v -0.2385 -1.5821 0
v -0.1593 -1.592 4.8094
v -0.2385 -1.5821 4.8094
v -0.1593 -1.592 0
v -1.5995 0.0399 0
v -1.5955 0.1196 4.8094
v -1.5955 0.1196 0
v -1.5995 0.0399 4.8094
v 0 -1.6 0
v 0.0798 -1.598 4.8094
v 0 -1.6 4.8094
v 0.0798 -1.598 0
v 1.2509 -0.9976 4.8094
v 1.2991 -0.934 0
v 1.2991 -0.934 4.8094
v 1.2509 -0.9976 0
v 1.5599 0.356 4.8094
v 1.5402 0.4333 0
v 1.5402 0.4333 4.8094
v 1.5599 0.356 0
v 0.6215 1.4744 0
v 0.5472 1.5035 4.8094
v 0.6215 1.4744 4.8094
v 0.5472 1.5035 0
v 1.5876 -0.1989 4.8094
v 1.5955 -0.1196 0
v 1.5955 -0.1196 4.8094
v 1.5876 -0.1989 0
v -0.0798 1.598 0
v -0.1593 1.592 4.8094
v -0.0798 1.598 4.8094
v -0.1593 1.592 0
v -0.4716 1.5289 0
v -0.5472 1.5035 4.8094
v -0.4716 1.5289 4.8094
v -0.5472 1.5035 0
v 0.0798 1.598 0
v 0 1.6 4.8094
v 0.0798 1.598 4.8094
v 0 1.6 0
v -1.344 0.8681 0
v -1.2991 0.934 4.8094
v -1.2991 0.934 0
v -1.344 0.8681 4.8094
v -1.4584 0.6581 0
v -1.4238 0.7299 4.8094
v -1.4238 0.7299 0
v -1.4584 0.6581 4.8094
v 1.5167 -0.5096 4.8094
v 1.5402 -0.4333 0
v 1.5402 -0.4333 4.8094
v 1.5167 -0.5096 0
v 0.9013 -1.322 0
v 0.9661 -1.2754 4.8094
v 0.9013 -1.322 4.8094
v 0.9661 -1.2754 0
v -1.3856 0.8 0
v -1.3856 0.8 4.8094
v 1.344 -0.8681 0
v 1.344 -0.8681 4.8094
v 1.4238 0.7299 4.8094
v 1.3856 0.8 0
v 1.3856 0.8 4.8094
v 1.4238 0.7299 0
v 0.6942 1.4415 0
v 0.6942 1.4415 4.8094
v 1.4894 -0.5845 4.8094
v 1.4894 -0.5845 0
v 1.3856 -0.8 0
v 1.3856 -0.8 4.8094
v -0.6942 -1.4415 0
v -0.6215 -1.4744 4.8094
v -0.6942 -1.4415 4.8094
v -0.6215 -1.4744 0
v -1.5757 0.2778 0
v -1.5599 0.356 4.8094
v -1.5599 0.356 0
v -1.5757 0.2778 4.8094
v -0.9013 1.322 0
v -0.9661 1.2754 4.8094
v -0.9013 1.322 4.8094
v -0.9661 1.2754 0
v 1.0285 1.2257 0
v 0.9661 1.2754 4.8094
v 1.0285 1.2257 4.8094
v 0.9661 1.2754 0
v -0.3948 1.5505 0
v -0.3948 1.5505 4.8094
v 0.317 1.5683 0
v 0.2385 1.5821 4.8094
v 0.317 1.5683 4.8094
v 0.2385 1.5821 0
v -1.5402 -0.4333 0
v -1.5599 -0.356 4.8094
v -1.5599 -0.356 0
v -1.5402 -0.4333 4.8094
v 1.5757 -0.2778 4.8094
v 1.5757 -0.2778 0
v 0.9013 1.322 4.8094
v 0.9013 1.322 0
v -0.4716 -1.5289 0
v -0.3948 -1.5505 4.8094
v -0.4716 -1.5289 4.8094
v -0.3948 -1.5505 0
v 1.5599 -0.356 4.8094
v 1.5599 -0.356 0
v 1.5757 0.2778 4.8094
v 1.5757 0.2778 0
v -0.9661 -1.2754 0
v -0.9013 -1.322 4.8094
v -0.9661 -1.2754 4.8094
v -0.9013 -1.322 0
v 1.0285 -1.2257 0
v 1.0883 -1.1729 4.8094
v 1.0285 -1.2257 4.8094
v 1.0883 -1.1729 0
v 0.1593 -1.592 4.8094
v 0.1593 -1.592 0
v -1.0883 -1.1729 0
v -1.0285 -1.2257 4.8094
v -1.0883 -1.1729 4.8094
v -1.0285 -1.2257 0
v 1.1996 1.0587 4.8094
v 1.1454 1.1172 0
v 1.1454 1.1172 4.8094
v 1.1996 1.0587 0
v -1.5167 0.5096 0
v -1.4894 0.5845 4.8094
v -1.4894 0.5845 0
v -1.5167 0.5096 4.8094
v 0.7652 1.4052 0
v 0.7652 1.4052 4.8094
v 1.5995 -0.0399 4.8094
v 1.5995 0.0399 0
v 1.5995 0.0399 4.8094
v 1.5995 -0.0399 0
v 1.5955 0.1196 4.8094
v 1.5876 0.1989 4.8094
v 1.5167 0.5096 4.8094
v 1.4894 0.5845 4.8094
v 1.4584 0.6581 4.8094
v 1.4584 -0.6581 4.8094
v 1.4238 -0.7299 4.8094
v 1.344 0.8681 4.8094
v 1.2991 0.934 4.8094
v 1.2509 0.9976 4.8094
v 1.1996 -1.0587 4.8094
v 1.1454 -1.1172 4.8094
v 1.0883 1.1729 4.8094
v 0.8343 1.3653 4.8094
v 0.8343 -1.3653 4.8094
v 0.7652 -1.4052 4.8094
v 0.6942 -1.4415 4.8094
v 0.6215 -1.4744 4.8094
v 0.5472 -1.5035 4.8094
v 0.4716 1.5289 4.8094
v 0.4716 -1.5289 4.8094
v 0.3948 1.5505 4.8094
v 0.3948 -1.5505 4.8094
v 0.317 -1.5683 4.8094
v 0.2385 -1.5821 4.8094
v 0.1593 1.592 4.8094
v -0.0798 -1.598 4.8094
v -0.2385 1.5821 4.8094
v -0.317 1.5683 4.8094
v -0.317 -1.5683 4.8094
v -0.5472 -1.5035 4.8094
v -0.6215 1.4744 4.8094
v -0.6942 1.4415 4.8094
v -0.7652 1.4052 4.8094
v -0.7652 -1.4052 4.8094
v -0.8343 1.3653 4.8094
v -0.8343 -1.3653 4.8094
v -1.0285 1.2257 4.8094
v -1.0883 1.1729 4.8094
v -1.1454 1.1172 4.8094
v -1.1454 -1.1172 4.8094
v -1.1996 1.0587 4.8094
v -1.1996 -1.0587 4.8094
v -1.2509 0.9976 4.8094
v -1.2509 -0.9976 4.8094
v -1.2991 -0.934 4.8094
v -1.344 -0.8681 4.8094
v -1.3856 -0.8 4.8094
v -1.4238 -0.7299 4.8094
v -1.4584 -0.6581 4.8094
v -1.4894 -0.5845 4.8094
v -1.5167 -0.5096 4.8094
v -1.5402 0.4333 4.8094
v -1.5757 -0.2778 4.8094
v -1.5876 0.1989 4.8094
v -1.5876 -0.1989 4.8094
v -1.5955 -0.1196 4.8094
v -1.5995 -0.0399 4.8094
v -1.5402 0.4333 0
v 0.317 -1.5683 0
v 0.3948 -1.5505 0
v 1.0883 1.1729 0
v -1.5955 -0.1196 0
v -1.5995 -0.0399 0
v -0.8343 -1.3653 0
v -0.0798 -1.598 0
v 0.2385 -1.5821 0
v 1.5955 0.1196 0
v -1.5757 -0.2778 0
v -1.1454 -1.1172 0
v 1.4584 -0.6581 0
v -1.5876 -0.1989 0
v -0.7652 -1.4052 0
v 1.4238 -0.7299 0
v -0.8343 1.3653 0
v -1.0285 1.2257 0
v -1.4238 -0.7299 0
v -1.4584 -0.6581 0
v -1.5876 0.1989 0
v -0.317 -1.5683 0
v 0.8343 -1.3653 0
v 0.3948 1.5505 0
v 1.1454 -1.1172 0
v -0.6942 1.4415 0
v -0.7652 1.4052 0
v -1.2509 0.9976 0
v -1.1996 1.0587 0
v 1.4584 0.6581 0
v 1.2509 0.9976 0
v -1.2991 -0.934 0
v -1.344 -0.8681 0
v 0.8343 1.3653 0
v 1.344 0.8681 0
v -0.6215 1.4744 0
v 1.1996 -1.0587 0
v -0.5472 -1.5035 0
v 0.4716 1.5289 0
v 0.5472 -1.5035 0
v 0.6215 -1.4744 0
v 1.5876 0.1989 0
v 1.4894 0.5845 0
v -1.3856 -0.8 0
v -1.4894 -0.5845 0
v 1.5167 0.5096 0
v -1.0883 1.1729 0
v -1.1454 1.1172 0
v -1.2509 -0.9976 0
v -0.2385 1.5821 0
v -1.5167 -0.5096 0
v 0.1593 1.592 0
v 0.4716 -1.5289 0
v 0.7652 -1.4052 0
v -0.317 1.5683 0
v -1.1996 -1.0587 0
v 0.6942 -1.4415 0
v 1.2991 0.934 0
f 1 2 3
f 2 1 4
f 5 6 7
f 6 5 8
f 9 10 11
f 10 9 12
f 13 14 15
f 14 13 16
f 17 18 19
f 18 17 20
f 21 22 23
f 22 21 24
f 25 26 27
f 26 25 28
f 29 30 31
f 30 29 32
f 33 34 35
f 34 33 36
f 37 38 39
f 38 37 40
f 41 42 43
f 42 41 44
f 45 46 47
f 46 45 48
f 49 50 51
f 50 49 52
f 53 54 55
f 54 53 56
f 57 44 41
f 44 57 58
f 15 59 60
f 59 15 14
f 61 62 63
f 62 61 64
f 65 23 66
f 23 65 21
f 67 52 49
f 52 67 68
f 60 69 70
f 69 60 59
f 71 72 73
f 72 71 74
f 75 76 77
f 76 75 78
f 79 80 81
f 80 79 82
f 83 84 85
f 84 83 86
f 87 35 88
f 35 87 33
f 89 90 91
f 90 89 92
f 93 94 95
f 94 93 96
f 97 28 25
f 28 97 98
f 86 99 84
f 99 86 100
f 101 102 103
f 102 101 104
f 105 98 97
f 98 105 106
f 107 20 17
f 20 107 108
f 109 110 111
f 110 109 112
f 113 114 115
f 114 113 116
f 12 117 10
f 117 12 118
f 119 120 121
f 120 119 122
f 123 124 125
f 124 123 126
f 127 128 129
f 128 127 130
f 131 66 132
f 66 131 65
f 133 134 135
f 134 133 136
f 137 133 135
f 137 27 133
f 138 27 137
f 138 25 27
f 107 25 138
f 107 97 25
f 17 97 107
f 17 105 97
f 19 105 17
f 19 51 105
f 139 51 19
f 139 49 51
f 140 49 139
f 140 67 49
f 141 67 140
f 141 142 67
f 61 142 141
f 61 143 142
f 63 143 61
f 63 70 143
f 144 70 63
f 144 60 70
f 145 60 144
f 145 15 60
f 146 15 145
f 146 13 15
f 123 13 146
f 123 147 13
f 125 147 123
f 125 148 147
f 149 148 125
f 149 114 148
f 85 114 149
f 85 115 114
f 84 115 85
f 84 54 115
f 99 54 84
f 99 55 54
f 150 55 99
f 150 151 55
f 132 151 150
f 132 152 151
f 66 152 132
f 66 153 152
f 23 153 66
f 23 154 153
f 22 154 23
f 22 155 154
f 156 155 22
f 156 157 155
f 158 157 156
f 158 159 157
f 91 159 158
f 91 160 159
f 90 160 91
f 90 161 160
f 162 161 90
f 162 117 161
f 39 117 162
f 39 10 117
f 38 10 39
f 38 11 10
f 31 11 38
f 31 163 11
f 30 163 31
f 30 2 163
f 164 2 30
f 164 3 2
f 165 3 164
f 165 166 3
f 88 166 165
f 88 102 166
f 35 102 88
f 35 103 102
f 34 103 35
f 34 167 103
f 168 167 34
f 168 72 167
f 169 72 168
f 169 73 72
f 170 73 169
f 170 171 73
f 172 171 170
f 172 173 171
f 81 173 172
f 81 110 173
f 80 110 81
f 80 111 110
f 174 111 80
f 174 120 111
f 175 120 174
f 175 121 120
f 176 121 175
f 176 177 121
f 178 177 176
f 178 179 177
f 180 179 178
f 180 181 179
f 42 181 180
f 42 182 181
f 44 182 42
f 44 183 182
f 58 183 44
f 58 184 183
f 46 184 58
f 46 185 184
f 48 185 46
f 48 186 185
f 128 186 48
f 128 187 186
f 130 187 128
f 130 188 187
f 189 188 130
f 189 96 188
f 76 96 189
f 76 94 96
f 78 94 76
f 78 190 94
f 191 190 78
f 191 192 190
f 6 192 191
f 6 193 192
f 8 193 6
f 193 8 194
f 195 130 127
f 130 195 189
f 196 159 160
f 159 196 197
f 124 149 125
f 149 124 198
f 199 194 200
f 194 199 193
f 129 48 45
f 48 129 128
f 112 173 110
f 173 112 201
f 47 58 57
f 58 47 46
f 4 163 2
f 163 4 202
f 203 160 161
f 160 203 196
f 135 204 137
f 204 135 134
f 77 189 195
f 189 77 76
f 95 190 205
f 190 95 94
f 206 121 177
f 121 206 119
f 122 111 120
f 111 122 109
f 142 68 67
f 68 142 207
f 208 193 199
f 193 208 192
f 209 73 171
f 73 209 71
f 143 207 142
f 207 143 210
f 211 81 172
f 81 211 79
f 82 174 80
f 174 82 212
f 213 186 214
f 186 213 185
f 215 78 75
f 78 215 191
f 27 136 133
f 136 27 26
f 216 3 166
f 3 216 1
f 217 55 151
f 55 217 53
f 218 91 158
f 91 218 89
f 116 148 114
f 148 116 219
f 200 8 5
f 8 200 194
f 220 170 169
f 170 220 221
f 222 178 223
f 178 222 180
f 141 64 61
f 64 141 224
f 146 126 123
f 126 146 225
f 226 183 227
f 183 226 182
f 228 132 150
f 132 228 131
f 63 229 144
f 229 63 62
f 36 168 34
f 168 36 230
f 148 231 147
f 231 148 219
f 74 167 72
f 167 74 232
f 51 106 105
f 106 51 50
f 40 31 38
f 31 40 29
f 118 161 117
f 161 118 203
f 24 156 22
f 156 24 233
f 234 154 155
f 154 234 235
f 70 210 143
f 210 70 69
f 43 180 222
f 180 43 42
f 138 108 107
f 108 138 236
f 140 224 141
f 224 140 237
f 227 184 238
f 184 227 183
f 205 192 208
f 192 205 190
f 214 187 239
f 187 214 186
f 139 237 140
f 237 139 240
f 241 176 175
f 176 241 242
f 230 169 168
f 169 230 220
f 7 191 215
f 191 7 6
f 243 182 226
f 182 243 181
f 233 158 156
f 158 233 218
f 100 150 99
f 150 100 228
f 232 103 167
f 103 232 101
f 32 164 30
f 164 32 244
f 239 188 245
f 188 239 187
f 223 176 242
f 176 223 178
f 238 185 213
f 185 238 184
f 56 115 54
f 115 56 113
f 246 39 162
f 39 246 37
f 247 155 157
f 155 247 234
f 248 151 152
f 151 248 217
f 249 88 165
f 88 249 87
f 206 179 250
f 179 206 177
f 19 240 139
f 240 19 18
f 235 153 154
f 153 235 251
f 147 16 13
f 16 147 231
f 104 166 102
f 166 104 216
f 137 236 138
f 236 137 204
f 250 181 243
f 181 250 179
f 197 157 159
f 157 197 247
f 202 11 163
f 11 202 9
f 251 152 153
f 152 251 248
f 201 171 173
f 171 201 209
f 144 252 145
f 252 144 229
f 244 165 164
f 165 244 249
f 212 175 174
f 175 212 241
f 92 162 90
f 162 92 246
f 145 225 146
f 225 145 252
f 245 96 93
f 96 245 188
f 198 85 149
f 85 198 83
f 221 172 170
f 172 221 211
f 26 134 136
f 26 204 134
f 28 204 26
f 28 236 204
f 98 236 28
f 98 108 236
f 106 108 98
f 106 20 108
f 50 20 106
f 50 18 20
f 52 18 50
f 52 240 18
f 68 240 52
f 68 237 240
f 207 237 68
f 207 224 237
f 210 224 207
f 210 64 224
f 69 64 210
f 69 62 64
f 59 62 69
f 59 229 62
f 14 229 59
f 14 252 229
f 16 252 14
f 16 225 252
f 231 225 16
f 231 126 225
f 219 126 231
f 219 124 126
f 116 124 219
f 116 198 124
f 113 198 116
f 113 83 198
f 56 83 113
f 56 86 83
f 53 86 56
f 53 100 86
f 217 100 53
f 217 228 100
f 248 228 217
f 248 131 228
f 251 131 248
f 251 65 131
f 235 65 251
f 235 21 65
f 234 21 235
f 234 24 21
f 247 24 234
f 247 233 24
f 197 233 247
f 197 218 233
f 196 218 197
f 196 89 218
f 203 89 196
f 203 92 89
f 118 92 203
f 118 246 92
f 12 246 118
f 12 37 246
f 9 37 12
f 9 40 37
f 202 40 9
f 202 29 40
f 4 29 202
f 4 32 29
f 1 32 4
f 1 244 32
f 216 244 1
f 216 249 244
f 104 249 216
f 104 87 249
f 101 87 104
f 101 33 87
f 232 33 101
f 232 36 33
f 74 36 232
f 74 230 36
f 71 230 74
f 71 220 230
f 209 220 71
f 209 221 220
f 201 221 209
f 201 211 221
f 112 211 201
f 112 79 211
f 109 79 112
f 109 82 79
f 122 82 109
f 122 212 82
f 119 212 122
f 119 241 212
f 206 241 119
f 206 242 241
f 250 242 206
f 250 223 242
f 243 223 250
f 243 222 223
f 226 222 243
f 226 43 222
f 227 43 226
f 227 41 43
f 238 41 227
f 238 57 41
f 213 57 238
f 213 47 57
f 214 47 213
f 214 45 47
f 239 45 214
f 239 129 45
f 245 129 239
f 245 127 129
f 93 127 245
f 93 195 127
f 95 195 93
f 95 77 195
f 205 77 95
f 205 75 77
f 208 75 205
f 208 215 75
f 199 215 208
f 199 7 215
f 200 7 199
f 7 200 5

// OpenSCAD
// file: ../p/stud.scad
use <../lib.scad>
use <4-4cyli.scad>
use <4-4disc.scad>
use <4-4edge.scad>
$fa=1; $fs=0.2;
function ldraw_lib__stud(realsolid=false) = realsolid ? 
    [openscad(translate([0,0,-eps()], o=cylinder(4+eps(), r=6)),2)] : [
// 0 Stud
// 0 Name: stud.dat
// 0 Author: James Jessiman
// 0 !LDRAW_ORG Primitive UPDATE 2012-01
// 0 !LICENSE Licensed under CC BY 2.0 and CC BY 4.0 : see CAreadme.txt
// 
// 0 BFC CERTIFY CCW
  [0,"BFC","CERTIFY"],
  [0,"BFC","CCW"],
// 
// 0 !HISTORY 2002-04-04 [sbliss] Modified for BFC compliance
// 0 !HISTORY 2002-04-25 [PTadmin] Official Update 2002-02
// 0 !HISTORY 2007-06-24 [PTadmin] Header formatted for Contributor Agreement
// 0 !HISTORY 2008-07-01 [PTadmin] Official Update 2008-01
// 0 !HISTORY 2012-02-16 [Philo] Changed to CCW
// 0 !HISTORY 2012-03-30 [PTadmin] Official Update 2012-01
// 
// 
// 1 16 0 0 0 6 0 0 0 1 0 0 0 6 4-4edge.dat
  [1,16,0,0,0,6,0,0,0,1,0,0,0,6, ldraw_lib__4_4edge(realsolid)],
// 1 16 0 -4 0 6 0 0 0 1 0 0 0 6 4-4edge.dat
  [1,16,0,-4,0,6,0,0,0,1,0,0,0,6, ldraw_lib__4_4edge(realsolid)],
// 1 16 0 0 0 6 0 0 0 -4 0 0 0 6 4-4cyli.dat
  [1,16,0,0,0,6,0,0,0,-4,0,0,0,6, ldraw_lib__4_4cyli(realsolid)],
// 1 16 0 -4 0 6 0 0 0 1 0 0 0 6 4-4disc.dat
  [1,16,0,-4,0,6,0,0,0,1,0,0,0,6, ldraw_lib__4_4disc(realsolid)],
];
module ldraw_lib__stud(step=0, col=false, unit=2/5, alt=false, line=0.2, solid=!$preview)
    makepoly(ldraw_lib__stud(solid), step=step, col=col, unit=unit, alt=alt, line=line, solid=solid);
ldraw_lib__stud(line=0.2);
// file: ../p/box4t.scad
use <../lib.scad>
$fa=1; $fs=0.2;
function ldraw_lib__box4t(realsolid=false) = [
// 0 Box with 4 Adjacent Faces and All Edges
// 0 Name: box4t.dat
// 0 Author: Tore Eriksson [Tore_Eriksson]
// 0 !LDRAW_ORG Primitive UPDATE 2003-02
// 0 !LICENSE Licensed under CC BY 2.0 and CC BY 4.0 : see CAreadme.txt
// 
// 0 BFC CERTIFY CCW
  [0,"BFC","CERTIFY"],
  [0,"BFC","CCW"],
// 
// 0 !HISTORY 1997-09-29 [PTadmin] Official Update 1997-15
// 0 !HISTORY 2002-08-31 [izanette] Modified with WINDZ for BFC compliance
// 0 !HISTORY 2003-08-01 [PTadmin] Official Update 2003-02
// 0 !HISTORY 2007-06-24 [PTadmin] Header formatted for Contributor Agreement
// 0 !HISTORY 2008-07-01 [PTadmin] Official Update 2008-01
// 
// 
// 2 24 1 1 1 -1 1 1
  [2,24,1,1,1,-1,1,1],
// 2 24 -1 1 1 -1 1 -1
  [2,24,-1,1,1,-1,1,-1],
// 2 24 -1 1 -1 1 1 -1
  [2,24,-1,1,-1,1,1,-1],
// 2 24 1 1 -1 1 1 1
  [2,24,1,1,-1,1,1,1],
// 2 24 1 0 1 -1 0 1
  [2,24,1,0,1,-1,0,1],
// 2 24 -1 0 1 -1 0 -1
  [2,24,-1,0,1,-1,0,-1],
// 2 24 -1 0 -1 1 0 -1
  [2,24,-1,0,-1,1,0,-1],
// 2 24 1 0 -1 1 0 1
  [2,24,1,0,-1,1,0,1],
// 2 24 1 0 1 1 1 1
  [2,24,1,0,1,1,1,1],
// 2 24 -1 0 1 -1 1 1
  [2,24,-1,0,1,-1,1,1],
// 2 24 1 0 -1 1 1 -1
  [2,24,1,0,-1,1,1,-1],
// 2 24 -1 0 -1 -1 1 -1
  [2,24,-1,0,-1,-1,1,-1],
// 4 16 1 1 1 1 1 -1 -1 1 -1 -1 1 1
  [4,16,1,1,1,1,1,-1,-1,1,-1,-1,1,1],
// 4 16 1 1 1 -1 1 1 -1 0 1 1 0 1
  [4,16,1,1,1,-1,1,1,-1,0,1,1,0,1],
// 4 16 -1 1 1 -1 1 -1 -1 0 -1 -1 0 1
  [4,16,-1,1,1,-1,1,-1,-1,0,-1,-1,0,1],
// 0 4 16 -1 1 -1 -1 0 -1 1 0 -1 1 1 -1
// 4 16 1 1 -1 1 1 1 1 0 1 1 0 -1
  [4,16,1,1,-1,1,1,1,1,0,1,1,0,-1],
// 0
];
module ldraw_lib__box4t(step=0, col=false, unit=2/5, alt=false, line=0.2, solid=!$preview)
    makepoly(ldraw_lib__box4t(solid), step=step, col=col, unit=unit, alt=alt, line=line, solid=solid);
ldraw_lib__box4t(line=0.2);
// file: ../p/4-4edge.scad
use <../lib.scad>
$fa=1; $fs=0.2;
function ldraw_lib__4_4edge(realsolid=false) = [
// 0 Circle 1.0
// 0 Name: 4-4edge.dat
// 0 Author: James Jessiman
// 0 !LDRAW_ORG Primitive UPDATE 2017-01
// 0 !LICENSE Licensed under CC BY 2.0 and CC BY 4.0 : see CAreadme.txt
// 
// 0 BFC CERTIFY CCW
  [0,"BFC","CERTIFY"],
  [0,"BFC","CCW"],
// 
// 0 !HISTORY 1998-12-15 [PTadmin] Official Update 1998-10
// 0 !HISTORY 2005-12-28 [PTadmin] Official Update 2005-01
// 0 !HISTORY 2007-06-24 [PTadmin] Header formatted for Contributor Agreement
// 0 !HISTORY 2008-07-01 [PTadmin] Official Update 2008-01
// 0 !HISTORY 2017-01-15 [Steffen] BFCed
// 0 !HISTORY 2017-12-30 [PTadmin] Official Update 2017-01
// 
// 
// 2 24 1 0 0 0.9239 0 0.3827
  [2,24,1,0,0,0.9239,0,0.3827],
// 2 24 0.9239 0 0.3827 0.7071 0 0.7071
  [2,24,0.9239,0,0.3827,0.7071,0,0.7071],
// 2 24 0.7071 0 0.7071 0.3827 0 0.9239
  [2,24,0.7071,0,0.7071,0.3827,0,0.9239],
// 2 24 0.3827 0 0.9239 0 0 1
  [2,24,0.3827,0,0.9239,0,0,1],
// 2 24 0 0 1 -0.3827 0 0.9239
  [2,24,0,0,1,-0.3827,0,0.9239],
// 2 24 -0.3827 0 0.9239 -0.7071 0 0.7071
  [2,24,-0.3827,0,0.9239,-0.7071,0,0.7071],
// 2 24 -0.7071 0 0.7071 -0.9239 0 0.3827
  [2,24,-0.7071,0,0.7071,-0.9239,0,0.3827],
// 2 24 -0.9239 0 0.3827 -1 0 -0
  [2,24,-0.9239,0,0.3827,-1,0,-0],
// 2 24 -1 0 -0 -0.9239 0 -0.3827
  [2,24,-1,0,-0,-0.9239,0,-0.3827],
// 2 24 -0.9239 0 -0.3827 -0.7071 0 -0.7071
  [2,24,-0.9239,0,-0.3827,-0.7071,0,-0.7071],
// 2 24 -0.7071 0 -0.7071 -0.3827 0 -0.9239
  [2,24,-0.7071,0,-0.7071,-0.3827,0,-0.9239],
// 2 24 -0.3827 0 -0.9239 0 0 -1
  [2,24,-0.3827,0,-0.9239,0,0,-1],
// 2 24 0 0 -1 0.3827 0 -0.9239
  [2,24,0,0,-1,0.3827,0,-0.9239],
// 2 24 0.3827 0 -0.9239 0.7071 0 -0.7071
  [2,24,0.3827,0,-0.9239,0.7071,0,-0.7071],
// 2 24 0.7071 0 -0.7071 0.9239 0 -0.3827
  [2,24,0.7071,0,-0.7071,0.9239,0,-0.3827],
// 2 24 0.9239 0 -0.3827 1 0 0
  [2,24,0.9239,0,-0.3827,1,0,0],
];
module ldraw_lib__4_4edge(step=0, col=false, unit=2/5, alt=false, line=0.2, solid=!$preview)
    makepoly(ldraw_lib__4_4edge(solid), step=step, col=col, unit=unit, alt=alt, line=line, solid=solid);
ldraw_lib__4_4edge(line=0.2);
// file: ../p/4-4disc.scad
use <../lib.scad>
$fa=1; $fs=0.2;
function ldraw_lib__4_4disc(realsolid=false) = [
// 0 Disc 1.0
// 0 Name: 4-4disc.dat
// 0 Author: James Jessiman
// 0 !LDRAW_ORG Primitive UPDATE 2002-02
// 0 !LICENSE Licensed under CC BY 2.0 and CC BY 4.0 : see CAreadme.txt
// 
// 0 BFC CERTIFY CCW
  [0,"BFC","CERTIFY"],
  [0,"BFC","CCW"],
// 
// 0 !HISTORY 1998-12-15 [PTadmin] Official Update 1998-10
// 0 !HISTORY 2002-03-23 [sbliss] Added BFC statement
// 0 !HISTORY 2002-04-25 [PTadmin] Official Update 2002-02
// 0 !HISTORY 2007-06-24 [PTadmin] Header formatted for Contributor Agreement
// 0 !HISTORY 2008-07-01 [PTadmin] Official Update 2008-01
// 
// 
// 3 16 0 0 0 1 0 0 0.9239 0 0.3827
  [3,16,0,0,0,1,0,0,0.9239,0,0.3827],
// 3 16 0 0 0 0.9239 0 0.3827 0.7071 0 0.7071
  [3,16,0,0,0,0.9239,0,0.3827,0.7071,0,0.7071],
// 3 16 0 0 0 0.7071 0 0.7071 0.3827 0 0.9239
  [3,16,0,0,0,0.7071,0,0.7071,0.3827,0,0.9239],
// 3 16 0 0 0 0.3827 0 0.9239 0 0 1
  [3,16,0,0,0,0.3827,0,0.9239,0,0,1],
// 3 16 0 0 0 0 0 1 -0.3827 0 0.9239
  [3,16,0,0,0,0,0,1,-0.3827,0,0.9239],
// 3 16 0 0 0 -0.3827 0 0.9239 -0.7071 0 0.7071
  [3,16,0,0,0,-0.3827,0,0.9239,-0.7071,0,0.7071],
// 3 16 0 0 0 -0.7071 0 0.7071 -0.9239 0 0.3827
  [3,16,0,0,0,-0.7071,0,0.7071,-0.9239,0,0.3827],
// 3 16 0 0 0 -0.9239 0 0.3827 -1 0 -0
  [3,16,0,0,0,-0.9239,0,0.3827,-1,0,-0],
// 3 16 0 0 0 -1 0 -0 -0.9239 0 -0.3827
  [3,16,0,0,0,-1,0,-0,-0.9239,0,-0.3827],
// 3 16 0 0 0 -0.9239 0 -0.3827 -0.7071 0 -0.7071
  [3,16,0,0,0,-0.9239,0,-0.3827,-0.7071,0,-0.7071],
// 3 16 0 0 0 -0.7071 0 -0.7071 -0.3827 0 -0.9239
  [3,16,0,0,0,-0.7071,0,-0.7071,-0.3827,0,-0.9239],
// 3 16 0 0 0 -0.3827 0 -0.9239 0 0 -1
  [3,16,0,0,0,-0.3827,0,-0.9239,0,0,-1],
// 3 16 0 0 0 0 0 -1 0.3827 0 -0.9239
  [3,16,0,0,0,0,0,-1,0.3827,0,-0.9239],
// 3 16 0 0 0 0.3827 0 -0.9239 0.7071 0 -0.7071
  [3,16,0,0,0,0.3827,0,-0.9239,0.7071,0,-0.7071],
// 3 16 0 0 0 0.7071 0 -0.7071 0.9239 0 -0.3827
  [3,16,0,0,0,0.7071,0,-0.7071,0.9239,0,-0.3827],
// 3 16 0 0 0 0.9239 0 -0.3827 1 0 0
  [3,16,0,0,0,0.9239,0,-0.3827,1,0,0],
// 0
];
module ldraw_lib__4_4disc(step=0, col=false, unit=2/5, alt=false, line=0.2, solid=!$preview)
    makepoly(ldraw_lib__4_4disc(solid), step=step, col=col, unit=unit, alt=alt, line=line, solid=solid);
ldraw_lib__4_4disc(line=0.2);
// file: ../p/4-4cyli.scad
use <../lib.scad>
$fa=1; $fs=0.2;
function ldraw_lib__4_4cyli(realsolid=false) = [
// 0 Cylinder 1.0
// 0 Name: 4-4cyli.dat
// 0 Author: James Jessiman
// 0 !LDRAW_ORG Primitive UPDATE 2005-01
// 0 !LICENSE Licensed under CC BY 2.0 and CC BY 4.0 : see CAreadme.txt
// 
// 0 BFC CERTIFY CCW
  [0,"BFC","CERTIFY"],
  [0,"BFC","CCW"],
// 
// 0 !HISTORY 1998-12-15 [PTadmin] Official Update 1998-10
// 0 !HISTORY 2002-03-23 [sbliss] Added BFC statement; merged headers from files in distributions LDraw 0.27 and Complete.
// 0 !HISTORY 2002-04-25 [PTadmin] Official Update 2002-02
// 0 !HISTORY 2004-12-14 [guyvivan] BFC CCW
// 0 !HISTORY 2005-12-28 [PTadmin] Official Update 2005-01
// 0 !HISTORY 2007-06-24 [PTadmin] Header formatted for Contributor Agreement
// 0 !HISTORY 2008-07-01 [PTadmin] Official Update 2008-01
// 
// 
// 4 16 1 1 0 0.9239 1 0.3827 0.9239 0 0.3827 1 0 0
  [4,16,1,1,0,0.9239,1,0.3827,0.9239,0,0.3827,1,0,0],
// 5 24 1 0 0 1 1 0 0.9239 0 0.3827 0.9239 0 -0.3827
  [5,24,1,0,0,1,1,0,0.9239,0,0.3827,0.9239,0,-0.3827],
// 4 16 0.9239 1 0.3827 0.7071 1 0.7071 0.7071 0 0.7071 0.9239 0 0.3827
  [4,16,0.9239,1,0.3827,0.7071,1,0.7071,0.7071,0,0.7071,0.9239,0,0.3827],
// 5 24 0.9239 0 0.3827 0.9239 1 0.3827 0.7071 0 0.7071 1 0 0
  [5,24,0.9239,0,0.3827,0.9239,1,0.3827,0.7071,0,0.7071,1,0,0],
// 4 16 0.7071 1 0.7071 0.3827 1 0.9239 0.3827 0 0.9239 0.7071 0 0.7071
  [4,16,0.7071,1,0.7071,0.3827,1,0.9239,0.3827,0,0.9239,0.7071,0,0.7071],
// 5 24 0.7071 0 0.7071 0.7071 1 0.7071 0.3827 0 0.9239 0.9239 0 0.3827
  [5,24,0.7071,0,0.7071,0.7071,1,0.7071,0.3827,0,0.9239,0.9239,0,0.3827],
// 4 16 0.3827 1 0.9239 0 1 1 0 0 1 0.3827 0 0.9239
  [4,16,0.3827,1,0.9239,0,1,1,0,0,1,0.3827,0,0.9239],
// 5 24 0.3827 0 0.9239 0.3827 1 0.9239 0 0 1 0.7071 0 0.7071
  [5,24,0.3827,0,0.9239,0.3827,1,0.9239,0,0,1,0.7071,0,0.7071],
// 4 16 0 1 1 -0.3827 1 0.9239 -0.3827 0 0.9239 0 0 1
  [4,16,0,1,1,-0.3827,1,0.9239,-0.3827,0,0.9239,0,0,1],
// 5 24 0 0 1 0 1 1 -0.3827 0 0.9239 0.3827 0 0.9239
  [5,24,0,0,1,0,1,1,-0.3827,0,0.9239,0.3827,0,0.9239],
// 4 16 -0.3827 1 0.9239 -0.7071 1 0.7071 -0.7071 0 0.7071 -0.3827 0 0.9239
  [4,16,-0.3827,1,0.9239,-0.7071,1,0.7071,-0.7071,0,0.7071,-0.3827,0,0.9239],
// 5 24 -0.3827 0 0.9239 -0.3827 1 0.9239 -0.7071 0 0.7071 0 0 1
  [5,24,-0.3827,0,0.9239,-0.3827,1,0.9239,-0.7071,0,0.7071,0,0,1],
// 4 16 -0.7071 1 0.7071 -0.9239 1 0.3827 -0.9239 0 0.3827 -0.7071 0 0.7071
  [4,16,-0.7071,1,0.7071,-0.9239,1,0.3827,-0.9239,0,0.3827,-0.7071,0,0.7071],
// 5 24 -0.7071 0 0.7071 -0.7071 1 0.7071 -0.9239 0 0.3827 -0.3827 0 0.9239
  [5,24,-0.7071,0,0.7071,-0.7071,1,0.7071,-0.9239,0,0.3827,-0.3827,0,0.9239],
// 4 16 -0.9239 1 0.3827 -1 1 0 -1 0 0 -0.9239 0 0.3827
  [4,16,-0.9239,1,0.3827,-1,1,0,-1,0,0,-0.9239,0,0.3827],
// 5 24 -0.9239 0 0.3827 -0.9239 1 0.3827 -1 0 0 -0.7071 0 0.7071
  [5,24,-0.9239,0,0.3827,-0.9239,1,0.3827,-1,0,0,-0.7071,0,0.7071],
// 4 16 -1 1 0 -0.9239 1 -0.3827 -0.9239 0 -0.3827 -1 0 0
  [4,16,-1,1,0,-0.9239,1,-0.3827,-0.9239,0,-0.3827,-1,0,0],
// 5 24 -1 0 0 -1 1 0 -0.9239 0 -0.3827 -0.9239 0 0.3827
  [5,24,-1,0,0,-1,1,0,-0.9239,0,-0.3827,-0.9239,0,0.3827],
// 4 16 -0.9239 1 -0.3827 -0.7071 1 -0.7071 -0.7071 0 -0.7071 -0.9239 0 -0.3827
  [4,16,-0.9239,1,-0.3827,-0.7071,1,-0.7071,-0.7071,0,-0.7071,-0.9239,0,-0.3827],
// 5 24 -0.9239 0 -0.3827 -0.9239 1 -0.3827 -0.7071 0 -0.7071 -1 0 0
  [5,24,-0.9239,0,-0.3827,-0.9239,1,-0.3827,-0.7071,0,-0.7071,-1,0,0],
// 4 16 -0.7071 1 -0.7071 -0.3827 1 -0.9239 -0.3827 0 -0.9239 -0.7071 0 -0.7071
  [4,16,-0.7071,1,-0.7071,-0.3827,1,-0.9239,-0.3827,0,-0.9239,-0.7071,0,-0.7071],
// 5 24 -0.7071 0 -0.7071 -0.7071 1 -0.7071 -0.3827 0 -0.9239 -0.9239 0 -0.3827
  [5,24,-0.7071,0,-0.7071,-0.7071,1,-0.7071,-0.3827,0,-0.9239,-0.9239,0,-0.3827],
// 4 16 -0.3827 1 -0.9239 0 1 -1 0 0 -1 -0.3827 0 -0.9239
  [4,16,-0.3827,1,-0.9239,0,1,-1,0,0,-1,-0.3827,0,-0.9239],
// 5 24 -0.3827 0 -0.9239 -0.3827 1 -0.9239 0 0 -1 -0.7071 0 -0.7071
  [5,24,-0.3827,0,-0.9239,-0.3827,1,-0.9239,0,0,-1,-0.7071,0,-0.7071],
// 4 16 0 1 -1 0.3827 1 -0.9239 0.3827 0 -0.9239 0 0 -1
  [4,16,0,1,-1,0.3827,1,-0.9239,0.3827,0,-0.9239,0,0,-1],
// 5 24 0 0 -1 0 1 -1 0.3827 0 -0.9239 -0.3827 0 -0.9239
  [5,24,0,0,-1,0,1,-1,0.3827,0,-0.9239,-0.3827,0,-0.9239],
// 4 16 0.3827 1 -0.9239 0.7071 1 -0.7071 0.7071 0 -0.7071 0.3827 0 -0.9239
  [4,16,0.3827,1,-0.9239,0.7071,1,-0.7071,0.7071,0,-0.7071,0.3827,0,-0.9239],
// 5 24 0.3827 0 -0.9239 0.3827 1 -0.9239 0.7071 0 -0.7071 0 0 -1
  [5,24,0.3827,0,-0.9239,0.3827,1,-0.9239,0.7071,0,-0.7071,0,0,-1],
// 4 16 0.7071 1 -0.7071 0.9239 1 -0.3827 0.9239 0 -0.3827 0.7071 0 -0.7071
  [4,16,0.7071,1,-0.7071,0.9239,1,-0.3827,0.9239,0,-0.3827,0.7071,0,-0.7071],
// 5 24 0.7071 0 -0.7071 0.7071 1 -0.7071 0.9239 0 -0.3827 0.3827 0 -0.9239
  [5,24,0.7071,0,-0.7071,0.7071,1,-0.7071,0.9239,0,-0.3827,0.3827,0,-0.9239],
// 4 16 0.9239 1 -0.3827 1 1 0 1 0 0 0.9239 0 -0.3827
  [4,16,0.9239,1,-0.3827,1,1,0,1,0,0,0.9239,0,-0.3827],
// 5 24 0.9239 0 -0.3827 0.9239 1 -0.3827 1 0 0 0.7071 0 -0.7071
  [5,24,0.9239,0,-0.3827,0.9239,1,-0.3827,1,0,0,0.7071,0,-0.7071],
// 0
];
module ldraw_lib__4_4cyli(step=0, col=false, unit=2/5, alt=false, line=0.2, solid=!$preview)
    makepoly(ldraw_lib__4_4cyli(solid), step=step, col=col, unit=unit, alt=alt, line=line, solid=solid);
ldraw_lib__4_4cyli(line=0.2);
// file: s/3004s01.scad
use <../../lib.scad>
use <../../p/box4t.scad>
use <../../p/box5.scad>
use <../../p/stud.scad>
use <../../p/stud3.scad>
$fa=1; $fs=0.2;
function ldraw_lib__s__3004s01(realsolid=false) = [
// 0 ~Brick  1 x  2 without Front Face
// 0 Name: s\3004s01.dat
// 0 Author: James Jessiman
// 0 !LDRAW_ORG Subpart UPDATE 2003-03
// 0 !LICENSE Licensed under CC BY 2.0 and CC BY 4.0 : see CAreadme.txt
// 
// 0 BFC CERTIFY CCW
  [0,"BFC","CERTIFY"],
  [0,"BFC","CCW"],
// 
// 0 !HISTORY 2003-09-07 [jriley] Subfiling, BFC
// 0 !HISTORY 2003-12-19 [PTadmin] Official Update 2003-03
// 0 !HISTORY 2007-08-29 [PTadmin] Header formatted for Contributor Agreement
// 0 !HISTORY 2008-07-01 [PTadmin] Official Update 2008-01
// 
// 
// 1 16 0 4 0 1 0 0 0 -5 0 0 0 1 stud3.dat
  [1,16,0,4,0,1,0,0,0,-5,0,0,0,1, ldraw_lib__stud3(realsolid)],
// 0 BFC INVERTNEXT
  [0,"BFC","INVERTNEXT"],
// 1 16 0 24 0 16 0 0 0 -20 0 0 0 6 box5.dat
  [1,16,0,24,0,16,0,0,0,-20,0,0,0,6, ldraw_lib__box5(realsolid)],
// 4 16 20 24 10 16 24 6 -16 24 6 -20 24 10
  [4,16,20,24,10,16,24,6,-16,24,6,-20,24,10],
// 4 16 -20 24 10 -16 24 6 -16 24 -6 -20 24 -10
  [4,16,-20,24,10,-16,24,6,-16,24,-6,-20,24,-10],
// 4 16 -20 24 -10 -16 24 -6 16 24 -6 20 24 -10
  [4,16,-20,24,-10,-16,24,-6,16,24,-6,20,24,-10],
// 4 16 20 24 -10 16 24 -6 16 24 6 20 24 10
  [4,16,20,24,-10,16,24,-6,16,24,6,20,24,10],
// 1 16 0 24 0 20 0 0 0 -24 0 0 0 10 box4t.dat
  [1,16,0,24,0,20,0,0,0,-24,0,0,0,10, ldraw_lib__box4t(realsolid)],
// 1 16 10 0 0 1 0 0 0 1 0 0 0 1 stud.dat
  [1,16,10,0,0,1,0,0,0,1,0,0,0,1, ldraw_lib__stud(realsolid)],
// 1 16 -10 0 0 1 0 0 0 1 0 0 0 1 stud.dat
  [1,16,-10,0,0,1,0,0,0,1,0,0,0,1, ldraw_lib__stud(realsolid)],
// 0
];
module ldraw_lib__s__3004s01(step=0, col=false, unit=2/5, alt=false, line=0.2, solid=!$preview)
    makepoly(ldraw_lib__s__3004s01(solid), step=step, col=col, unit=unit, alt=alt, line=line, solid=solid);
ldraw_lib__s__3004s01(line=0.2);
// file: ../p/stud3.scad
use <../lib.scad>
use <4-4cyli.scad>
use <4-4disc.scad>
use <4-4edge.scad>
$fa=1; $fs=0.2;
function ldraw_lib__stud3(realsolid=false) = realsolid ? 
    [openscad(translate([0,0,-eps()], o=cylinder(4+eps(), r=4)),2)] : [
// 0 Stud Tube Solid
// 0 Name: stud3.dat
// 0 Author: James Jessiman
// 0 !LDRAW_ORG Primitive UPDATE 2012-01
// 0 !LICENSE Licensed under CC BY 2.0 and CC BY 4.0 : see CAreadme.txt
// 
// 0 BFC CERTIFY CCW
  [0,"BFC","CERTIFY"],
  [0,"BFC","CCW"],
// 
// 0 !HISTORY 2002-04-04 [sbliss] Modified for BFC compliance
// 0 !HISTORY 2002-04-25 [PTadmin] Official Update 2002-02
// 0 !HISTORY 2007-06-24 [PTadmin] Header formatted for Contributor Agreement
// 0 !HISTORY 2008-07-01 [PTadmin] Official Update 2008-01
// 0 !HISTORY 2012-02-16 [Philo] Changed to CCW
// 0 !HISTORY 2012-03-30 [PTadmin] Official Update 2012-01
// 
// 
// 1 16 0 -4 0 4 0 0 0 1 0 0 0 4 4-4edge.dat
  [1,16,0,-4,0,4,0,0,0,1,0,0,0,4, ldraw_lib__4_4edge(realsolid)],
// 1 16 0 0 0 4 0 0 0 1 0 0 0 4 4-4edge.dat
  [1,16,0,0,0,4,0,0,0,1,0,0,0,4, ldraw_lib__4_4edge(realsolid)],
// 1 16 0 -4 0 4 0 0 0 1 0 0 0 4 4-4disc.dat
  [1,16,0,-4,0,4,0,0,0,1,0,0,0,4, ldraw_lib__4_4disc(realsolid)],
// 1 16 0 -4 0 4 0 0 0 4 0 0 0 4 4-4cyli.dat
  [1,16,0,-4,0,4,0,0,0,4,0,0,0,4, ldraw_lib__4_4cyli(realsolid)],
];
module ldraw_lib__stud3(step=0, col=false, unit=2/5, alt=false, line=0.2, solid=!$preview)
    makepoly(ldraw_lib__stud3(solid), step=step, col=col, unit=unit, alt=alt, line=line, solid=solid);
ldraw_lib__stud3(line=0.2);
// file: ../p/box5.scad
use <../lib.scad>
$fa=1; $fs=0.2;
function ldraw_lib__box5(realsolid=false) = [
// 0 Box with 5 Faces and All Edges
// 0 Name: box5.dat
// 0 Author: James Jessiman
// 0 !LDRAW_ORG Primitive UPDATE 2012-01
// 0 !LICENSE Licensed under CC BY 2.0 and CC BY 4.0 : see CAreadme.txt
// 
// 0 BFC CERTIFY CCW
  [0,"BFC","CERTIFY"],
  [0,"BFC","CCW"],
// 
// 0 !HISTORY 2002-04-03 [sbliss] Modified for BFC compliance
// 0 !HISTORY 2002-04-25 [PTadmin] Official Update 2002-02
// 0 !HISTORY 2007-06-24 [PTadmin] Header formatted for Contributor Agreement
// 0 !HISTORY 2008-07-01 [PTadmin] Official Update 2008-01
// 0 !HISTORY 2012-02-16 [Philo] Changed to CCW
// 0 !HISTORY 2012-03-30 [PTadmin] Official Update 2012-01
// 
// 
// 2 24 1 1 1 -1 1 1
  [2,24,1,1,1,-1,1,1],
// 2 24 -1 1 1 -1 1 -1
  [2,24,-1,1,1,-1,1,-1],
// 2 24 -1 1 -1 1 1 -1
  [2,24,-1,1,-1,1,1,-1],
// 2 24 1 1 -1 1 1 1
  [2,24,1,1,-1,1,1,1],
// 2 24 1 0 1 -1 0 1
  [2,24,1,0,1,-1,0,1],
// 2 24 -1 0 1 -1 0 -1
  [2,24,-1,0,1,-1,0,-1],
// 2 24 -1 0 -1 1 0 -1
  [2,24,-1,0,-1,1,0,-1],
// 2 24 1 0 -1 1 0 1
  [2,24,1,0,-1,1,0,1],
// 2 24 1 0 1 1 1 1
  [2,24,1,0,1,1,1,1],
// 2 24 -1 0 1 -1 1 1
  [2,24,-1,0,1,-1,1,1],
// 2 24 1 0 -1 1 1 -1
  [2,24,1,0,-1,1,1,-1],
// 2 24 -1 0 -1 -1 1 -1
  [2,24,-1,0,-1,-1,1,-1],
// 4 16 -1 1 1 1 1 1 1 1 -1 -1 1 -1
  [4,16,-1,1,1,1,1,1,1,1,-1,-1,1,-1],
// 4 16 -1 1 1 -1 0 1 1 0 1 1 1 1
  [4,16,-1,1,1,-1,0,1,1,0,1,1,1,1],
// 4 16 -1 1 -1 -1 0 -1 -1 0 1 -1 1 1
  [4,16,-1,1,-1,-1,0,-1,-1,0,1,-1,1,1],
// 4 16 1 1 -1 1 0 -1 -1 0 -1 -1 1 -1
  [4,16,1,1,-1,1,0,-1,-1,0,-1,-1,1,-1],
// 4 16 1 1 1 1 0 1 1 0 -1 1 1 -1
  [4,16,1,1,1,1,0,1,1,0,-1,1,1,-1],
];
module ldraw_lib__box5(step=0, col=false, unit=2/5, alt=false, line=0.2, solid=!$preview)
    makepoly(ldraw_lib__box5(solid), step=step, col=col, unit=unit, alt=alt, line=line, solid=solid);
ldraw_lib__box5(line=0.2);
// file: ../p/box4-1.scad
use <../lib.scad>
$fa=1; $fs=0.2;
function ldraw_lib__box4_1(realsolid=false) = [
// 0 Box with 4 Faces without 1 Edge
// 0 Name: box4-1.dat
// 0 Author: Tore Eriksson [Tore_Eriksson]
// 0 !LDRAW_ORG Primitive UPDATE 2012-01
// 0 !LICENSE Licensed under CC BY 2.0 and CC BY 4.0 : see CAreadme.txt
// 
// 0 BFC CERTIFY CCW
  [0,"BFC","CERTIFY"],
  [0,"BFC","CCW"],
// 
// 0 !HISTORY 1998-07-15 [PTadmin] Official Update 1998-07
// 0 !HISTORY 2002-04-05 [hafhead] Made BFC compliant
// 0 !HISTORY 2002-04-25 [PTadmin] Official Update 2002-02
// 0 !HISTORY 2007-06-24 [PTadmin] Header formatted for Contributor Agreement
// 0 !HISTORY 2008-07-01 [PTadmin] Official Update 2008-01
// 0 !HISTORY 2012-02-16 [Philo] Changed to CCW
// 0 !HISTORY 2012-03-30 [PTadmin] Official Update 2012-01
// 
// 
// 2 24 1 1 1 -1 1 1
  [2,24,1,1,1,-1,1,1],
// 2 24 -1 1 1 -1 1 -1
  [2,24,-1,1,1,-1,1,-1],
// 2 24 -1 1 -1 1 1 -1
  [2,24,-1,1,-1,1,1,-1],
// 2 24 1 1 -1 1 1 1
  [2,24,1,1,-1,1,1,1],
// 2 24 1 0 1 -1 0 1
  [2,24,1,0,1,-1,0,1],
// 2 24 -1 0 1 -1 0 -1
  [2,24,-1,0,1,-1,0,-1],
// 2 24 1 0 -1 1 0 1
  [2,24,1,0,-1,1,0,1],
// 2 24 1 0 1 1 1 1
  [2,24,1,0,1,1,1,1],
// 2 24 -1 0 1 -1 1 1
  [2,24,-1,0,1,-1,1,1],
// 2 24 1 0 -1 1 1 -1
  [2,24,1,0,-1,1,1,-1],
// 2 24 -1 0 -1 -1 1 -1
  [2,24,-1,0,-1,-1,1,-1],
// 4 16 -1 1 1 1 1 1 1 1 -1 -1 1 -1
  [4,16,-1,1,1,1,1,1,1,1,-1,-1,1,-1],
// 4 16 -1 1 1 -1 0 1 1 0 1 1 1 1
  [4,16,-1,1,1,-1,0,1,1,0,1,1,1,1],
// 4 16 -1 1 -1 -1 0 -1 -1 0 1 -1 1 1
  [4,16,-1,1,-1,-1,0,-1,-1,0,1,-1,1,1],
// 4 16 1 1 1 1 0 1 1 0 -1 1 1 -1
  [4,16,1,1,1,1,0,1,1,0,-1,1,1,-1],
];
module ldraw_lib__box4_1(step=0, col=false, unit=2/5, alt=false, line=0.2, solid=!$preview)
    makepoly(ldraw_lib__box4_1(solid), step=step, col=col, unit=unit, alt=alt, line=line, solid=solid);
ldraw_lib__box4_1(line=0.2);
// file: ../p/box3u2p.scad
use <../lib.scad>
$fa=1; $fs=0.2;
function ldraw_lib__box3u2p(realsolid=false) = [
// 0 Box with 3 Faces without 2 Parallel Edges
// 0 Name: box3u2p.dat
// 0 Author: Niels Karsdorp [nielsk]
// 0 !LDRAW_ORG Primitive UPDATE 2012-01
// 0 !LICENSE Licensed under CC BY 2.0 and CC BY 4.0 : see CAreadme.txt
// 
// 0 BFC CERTIFY CCW
  [0,"BFC","CERTIFY"],
  [0,"BFC","CCW"],
// 
// 0 !HISTORY 2003-03-12 [PTadmin] Official Update 2003-01
// 0 !HISTORY 2007-06-24 [PTadmin] Header formatted for Contributor Agreement
// 0 !HISTORY 2008-07-01 [PTadmin] Official Update 2008-01
// 0 !HISTORY 2012-02-16 [Philo] Changed to CCW
// 0 !HISTORY 2012-03-30 [PTadmin] Official Update 2012-01
// 
// 
// 2 24 1 1 1 -1 1 1
  [2,24,1,1,1,-1,1,1],
// 2 24 -1 1 -1 1 1 -1
  [2,24,-1,1,-1,1,1,-1],
// 2 24 1 0 1 -1 0 1
  [2,24,1,0,1,-1,0,1],
// 2 24 -1 0 -1 1 0 -1
  [2,24,-1,0,-1,1,0,-1],
// 2 24 1 1 1 1 1 -1
  [2,24,1,1,1,1,1,-1],
// 2 24 -1 1 1 -1 1 -1
  [2,24,-1,1,1,-1,1,-1],
// 2 24 1 1 1 1 0 1
  [2,24,1,1,1,1,0,1],
// 2 24 1 1 -1 1 0 -1
  [2,24,1,1,-1,1,0,-1],
// 2 24 -1 1 1 -1 0 1
  [2,24,-1,1,1,-1,0,1],
// 2 24 -1 1 -1 -1 0 -1
  [2,24,-1,1,-1,-1,0,-1],
// 4 16 -1 1 -1 -1 1 1 1 1 1 1 1 -1
  [4,16,-1,1,-1,-1,1,1,1,1,1,1,1,-1],
// 4 16 -1 1 1 -1 0 1 1 0 1 1 1 1
  [4,16,-1,1,1,-1,0,1,1,0,1,1,1,1],
// 4 16 1 1 -1 1 0 -1 -1 0 -1 -1 1 -1
  [4,16,1,1,-1,1,0,-1,-1,0,-1,-1,1,-1],
];
module ldraw_lib__box3u2p(step=0, col=false, unit=2/5, alt=false, line=0.2, solid=!$preview)
    makepoly(ldraw_lib__box3u2p(solid), step=step, col=col, unit=unit, alt=alt, line=line, solid=solid);
ldraw_lib__box3u2p(line=0.2);
// file: 3004.scad
use <../lib.scad>
use <s/3004s01.scad>
$fa=1; $fs=0.2;
function ldraw_lib__3004(realsolid=false) = [
// 0 Brick  1 x  2
// 0 Name: 3004.dat
// 0 Author: James Jessiman
// 0 !LDRAW_ORG Part UPDATE 2022-05
// 0 !LICENSE Licensed under CC BY 2.0 and CC BY 4.0 : see CAreadme.txt
// 
// 0 BFC CERTIFY CCW
  [0,"BFC","CERTIFY"],
  [0,"BFC","CCW"],
// 
// 0 !HISTORY 2001-10-26 [PTadmin] Official Update 2001-01
// 0 !HISTORY 2002-05-07 {unknown} BFC Certification
// 0 !HISTORY 2002-06-11 [PTadmin] Official Update 2002-03
// 0 !HISTORY 2007-05-07 [PTadmin] Header formatted for Contributor Agreement
// 0 !HISTORY 2008-07-01 [PTadmin] Official Update 2008-01
// 0 !HISTORY 2022-08-04 [MagFors] Using subfile
// 0 !HISTORY 2022-09-15 [PTadmin] Official Update 2022-05
// 
// 
// 1 16 0 0 0 1 0 0 0 1 0 0 0 1 s\3004s01.dat
  [1,16,0,0,0,1,0,0,0,1,0,0,0,1, ldraw_lib__s__3004s01(realsolid)],
// 4 16 -20 24 -10 20 24 -10 20 0 -10 -20 0 -10
  [4,16,-20,24,-10,20,24,-10,20,0,-10,-20,0,-10],
];
module ldraw_lib__3004(step=0, col=false, unit=2/5, alt=false, line=0.2, solid=!$preview)
    makepoly(ldraw_lib__3004(solid), step=step, col=col, unit=unit, alt=alt, line=line, solid=solid);
ldraw_lib__3004(line=0.2);
// file: s/20308s01.scad
use <../../lib.scad>
use <../../p/box3u2p.scad>
use <../../p/box4-1.scad>
use <../../p/box5.scad>
use <../../p/stud3.scad>
$fa=1; $fs=0.2;
function ldraw_lib__s__20308s01(realsolid=false) = [
// 0 ~Animal Head Cuboid without Decorated Surfaces
// 0 Name: s\20308s01.dat
// 0 Author: Philippe Hurbain [Philo]
// 0 !LDRAW_ORG Subpart UPDATE 2020-03
// 0 !LICENSE Licensed under CC BY 2.0 and CC BY 4.0 : see CAreadme.txt
// 
// 0 BFC CERTIFY CCW
  [0,"BFC","CERTIFY"],
  [0,"BFC","CCW"],
// 
// 0 !HISTORY 2016-03-18 {LEGO Digital Designer} Original part shape
// 0 !HISTORY 2020-04-16 [Philo] File preparation for LDraw Parts Tracker
// 0 !HISTORY 2020-12-29 [PTadmin] Official Update 2020-03
// 
// 
// 1 16 0 0 0 20 0 0 0 -16 0 0 0 10 box5.dat
  [1,16,0,0,0,20,0,0,0,-16,0,0,0,10, ldraw_lib__box5(realsolid)],
// 0 BFC INVERTNEXT
  [0,"BFC","INVERTNEXT"],
// 1 16 0 0 0 16 0 0 0 -12 0 0 0 6 box5.dat
  [1,16,0,0,0,16,0,0,0,-12,0,0,0,6, ldraw_lib__box5(realsolid)],
// 0 BFC INVERTNEXT
  [0,"BFC","INVERTNEXT"],
// 1 16 0 20 -29.5 3.5 0 0 0 -11 0 0 0 -7.5 box4-1.dat
  [1,16,0,20,-29.5,3.5,0,0,0,-11,0,0,0,-7.5, ldraw_lib__box4_1(realsolid)],
// 1 16 0 20 -18 0 0 16 0 -32.5 0 8 0 0 box3u2p.dat
  [1,16,0,20,-18,0,0,16,0,-32.5,0,8,0,0, ldraw_lib__box3u2p(realsolid)],
// 1 16 0 20 -33.5 0 0 7.5 0 -14.5 0 7.5 0 0 box3u2p.dat
  [1,16,0,20,-33.5,0,0,7.5,0,-14.5,0,7.5,0,0, ldraw_lib__box3u2p(realsolid)],
// 0 BFC INVERTNEXT
  [0,"BFC","INVERTNEXT"],
// 1 16 0 20 -16 0 0 12 0 -28 0 6 0 0 box3u2p.dat
  [1,16,0,20,-16,0,0,12,0,-28,0,6,0,0, ldraw_lib__box3u2p(realsolid)],
// 1 16 11 -12.5 -12 3.7 0 0 0 -7.5 0 0 0 2 box5.dat
  [1,16,11,-12.5,-12,3.7,0,0,0,-7.5,0,0,0,2, ldraw_lib__box5(realsolid)],
// 1 16 -11 -12.5 -12 3.7 0 0 0 -7.5 0 0 0 2 box5.dat
  [1,16,-11,-12.5,-12,3.7,0,0,0,-7.5,0,0,0,2, ldraw_lib__box5(realsolid)],
// 1 16 0 -12 0 1 0 0 0 -3 0 0 0 1 stud3.dat
  [1,16,0,-12,0,1,0,0,0,-3,0,0,0,1, ldraw_lib__stud3(realsolid)],
// 4 16 12 20 -10 12 -8 -10 16 -12.5 -10 16 20 -10
  [4,16,12,20,-10,12,-8,-10,16,-12.5,-10,16,20,-10],
// 4 16 -16 20 -10 -16 -12.5 -10 -12 -8 -10 -12 20 -10
  [4,16,-16,20,-10,-16,-12.5,-10,-12,-8,-10,-12,20,-10],
// 4 16 16 20 -26 12 20 -22 12 20 -10 16 20 -10
  [4,16,16,20,-26,12,20,-22,12,20,-10,16,20,-10],
// 4 16 -12 20 -22 -16 20 -26 -16 20 -10 -12 20 -10
  [4,16,-12,20,-22,-16,20,-26,-16,20,-10,-12,20,-10],
// 2 24 12 20 -10 16 20 -10
  [2,24,12,20,-10,16,20,-10],
// 2 24 -16 20 -10 -12 20 -10
  [2,24,-16,20,-10,-12,20,-10],
// 4 16 16 0 -6 20 0 -10 -20 0 -10 -16 0 -6
  [4,16,16,0,-6,20,0,-10,-20,0,-10,-16,0,-6],
// 4 16 -16 0 -6 -20 0 -10 -20 0 10 -16 0 6
  [4,16,-16,0,-6,-20,0,-10,-20,0,10,-16,0,6],
// 4 16 16 0 6 -16 0 6 -20 0 10 20 0 10
  [4,16,16,0,6,-16,0,6,-20,0,10,20,0,10],
// 4 16 20 0 -10 16 0 -6 16 0 6 20 0 10
  [4,16,20,0,-10,16,0,-6,16,0,6,20,0,10],
// 4 16 -3.5 20 -22 -7.5 20 -26 -16 20 -26 -12 20 -22
  [4,16,-3.5,20,-22,-7.5,20,-26,-16,20,-26,-12,20,-22],
// 4 16 -7.5 20 -41 -7.5 20 -26 -3.5 20 -22 -3.5 20 -37
  [4,16,-7.5,20,-41,-7.5,20,-26,-3.5,20,-22,-3.5,20,-37],
// 4 16 -7.5 20 -41 -3.5 20 -37 3.5 20 -37 7.5 20 -41
  [4,16,-7.5,20,-41,-3.5,20,-37,3.5,20,-37,7.5,20,-41],
// 4 16 7.5 20 -41 3.5 20 -37 3.5 20 -22 7.5 20 -26
  [4,16,7.5,20,-41,3.5,20,-37,3.5,20,-22,7.5,20,-26],
// 4 16 7.5 20 -26 3.5 20 -22 12 20 -22 16 20 -26
  [4,16,7.5,20,-26,3.5,20,-22,12,20,-22,16,20,-26],
// 4 16 12 20 -22 3.5 20 -22 3.5 9 -22 12 -8 -22
  [4,16,12,20,-22,3.5,20,-22,3.5,9,-22,12,-8,-22],
// 4 16 -12 -8 -22 12 -8 -22 3.5 9 -22 -3.5 9 -22
  [4,16,-12,-8,-22,12,-8,-22,3.5,9,-22,-3.5,9,-22],
// 4 16 -12 -8 -22 -3.5 9 -22 -3.5 20 -22 -12 20 -22
  [4,16,-12,-8,-22,-3.5,9,-22,-3.5,20,-22,-12,20,-22],
// 2 24 12 20 -22 3.5 20 -22
  [2,24,12,20,-22,3.5,20,-22],
// 2 24 -3.5 20 -22 -12 20 -22
  [2,24,-3.5,20,-22,-12,20,-22],
// 2 24 -7.5 20 -26 -16 20 -26
  [2,24,-7.5,20,-26,-16,20,-26],
// 2 24 16 20 -26 7.5 20 -26
  [2,24,16,20,-26,7.5,20,-26],
// 2 24 7.5 20 -41 -7.5 20 -41
  [2,24,7.5,20,-41,-7.5,20,-41],
];
module ldraw_lib__s__20308s01(step=0, col=false, unit=2/5, alt=false, line=0.2, solid=!$preview)
    makepoly(ldraw_lib__s__20308s01(solid), step=step, col=col, unit=unit, alt=alt, line=line, solid=solid);
ldraw_lib__s__20308s01(line=0.2);
// main file
use <../lib.scad>
use <s/20308s01.scad>
$fa=1; $fs=0.2;
function ldraw_lib__20308p02(realsolid=false) = [
// 0 Animal Head Cuboid with Red Eyes Pattern
// 0 Name: 20308p02.dat
// 0 Author: Philippe Hurbain [Philo]
// 0 !LDRAW_ORG Part UPDATE 2020-03
// 0 !LICENSE Licensed under CC BY 2.0 and CC BY 4.0 : see CAreadme.txt
// 
// 0 BFC CERTIFY CCW
  [0,"BFC","CERTIFY"],
  [0,"BFC","CCW"],
// 
// 0 !KEYWORDS Bricklink 21098pb02, DesignID 34042, Dog, Minecraft, Wolf
// 
// 0 !HISTORY 2016-03-18 {LEGO Digital Designer} Original part shape
// 0 !HISTORY 2020-04-16 [Philo] File preparation for LDraw Parts Tracker
// 0 !HISTORY 2020-12-29 [PTadmin] Official Update 2020-03
// 
// 
// 1 16 0 0 0 1 0 0 0 1 0 0 0 1 s\20308s01.dat
  [1,16,0,0,0,1,0,0,0,1,0,0,0,1, ldraw_lib__s__20308s01(realsolid)],
// 4 320 -5.8 0.5 -26 -5.2 1.1 -26 -5.2 -3.8 -26 -5.8 -3.2 -26
  [4,320,-5.8,0.5,-26,-5.2,1.1,-26,-5.2,-3.8,-26,-5.8,-3.2,-26],
// 4 320 -5.2 1.1 -26 -5.8 0.5 -26 -9.4 0.5 -26 -14.1 1.1 -26
  [4,320,-5.2,1.1,-26,-5.8,0.5,-26,-9.4,0.5,-26,-14.1,1.1,-26],
// 4 320 -14.1 -3.8 -26 -14.1 1.1 -26 -9.4 0.5 -26 -9.4 -3.2 -26
  [4,320,-14.1,-3.8,-26,-14.1,1.1,-26,-9.4,0.5,-26,-9.4,-3.2,-26],
// 4 320 -5.2 -3.8 -26 -14.1 -3.8 -26 -9.4 -3.2 -26 -5.8 -3.2 -26
  [4,320,-5.2,-3.8,-26,-14.1,-3.8,-26,-9.4,-3.2,-26,-5.8,-3.2,-26],
// 4 4 -5.8 -3.2 -26 -9.4 -3.2 -26 -9.4 0.5 -26 -5.8 0.5 -26
  [4,4,-5.8,-3.2,-26,-9.4,-3.2,-26,-9.4,0.5,-26,-5.8,0.5,-26],
// 4 16 -16 -12.5 -26 -14.1 -3.8 -26 -5.2 -3.8 -26 16 -12.5 -26
  [4,16,-16,-12.5,-26,-14.1,-3.8,-26,-5.2,-3.8,-26,16,-12.5,-26],
// 4 16 -14.1 1.1 -26 -14.1 -3.8 -26 -16 -12.5 -26 -16 20 -26
  [4,16,-14.1,1.1,-26,-14.1,-3.8,-26,-16,-12.5,-26,-16,20,-26],
// 4 16 -14.1 1.1 -26 -16 20 -26 -7.5 20 -26 -7.5 5.5 -26
  [4,16,-14.1,1.1,-26,-16,20,-26,-7.5,20,-26,-7.5,5.5,-26],
// 3 16 -5.2 1.1 -26 -14.1 1.1 -26 -7.5 5.5 -26
  [3,16,-5.2,1.1,-26,-14.1,1.1,-26,-7.5,5.5,-26],
// 4 320 5.2 -3.8 -26 5.2 1.1 -26 5.8 0.5 -26 5.8 -3.2 -26
  [4,320,5.2,-3.8,-26,5.2,1.1,-26,5.8,0.5,-26,5.8,-3.2,-26],
// 4 320 9.4 0.5 -26 5.8 0.5 -26 5.2 1.1 -26 14.1 1.1 -26
  [4,320,9.4,0.5,-26,5.8,0.5,-26,5.2,1.1,-26,14.1,1.1,-26],
// 4 320 9.4 0.5 -26 14.1 1.1 -26 14.1 -3.8 -26 9.4 -3.2 -26
  [4,320,9.4,0.5,-26,14.1,1.1,-26,14.1,-3.8,-26,9.4,-3.2,-26],
// 4 320 9.4 -3.2 -26 14.1 -3.8 -26 5.2 -3.8 -26 5.8 -3.2 -26
  [4,320,9.4,-3.2,-26,14.1,-3.8,-26,5.2,-3.8,-26,5.8,-3.2,-26],
// 4 4 9.4 0.5 -26 9.4 -3.2 -26 5.8 -3.2 -26 5.8 0.5 -26
  [4,4,9.4,0.5,-26,9.4,-3.2,-26,5.8,-3.2,-26,5.8,0.5,-26],
// 3 16 16 -12.5 -26 5.2 -3.8 -26 14.1 -3.8 -26
  [3,16,16,-12.5,-26,5.2,-3.8,-26,14.1,-3.8,-26],
// 4 16 16 -12.5 -26 14.1 -3.8 -26 14.1 1.1 -26 16 20 -26
  [4,16,16,-12.5,-26,14.1,-3.8,-26,14.1,1.1,-26,16,20,-26],
// 4 16 7.5 20 -26 16 20 -26 14.1 1.1 -26 7.5 5.5 -26
  [4,16,7.5,20,-26,16,20,-26,14.1,1.1,-26,7.5,5.5,-26],
// 4 16 7.5 5.5 -26 14.1 1.1 -26 5.2 1.1 -26 -7.5 5.5 -26
  [4,16,7.5,5.5,-26,14.1,1.1,-26,5.2,1.1,-26,-7.5,5.5,-26],
// 4 16 5.2 -3.8 -26 16 -12.5 -26 -5.2 -3.8 -26 -5.2 1.1 -26
  [4,16,5.2,-3.8,-26,16,-12.5,-26,-5.2,-3.8,-26,-5.2,1.1,-26],
// 4 16 5.2 1.1 -26 5.2 -3.8 -26 -5.2 1.1 -26 -7.5 5.5 -26
  [4,16,5.2,1.1,-26,5.2,-3.8,-26,-5.2,1.1,-26,-7.5,5.5,-26],
// 4 0 -2.1 7.3 -41 -2.1 11.4 -41 2.1 11.4 -41 2.1 7.3 -41
  [4,0,-2.1,7.3,-41,-2.1,11.4,-41,2.1,11.4,-41,2.1,7.3,-41],
// 4 13 -5.9 15.4 -41 -5.9 19.1 -41 5.9 19.1 -41 5.9 15.4 -41
  [4,13,-5.9,15.4,-41,-5.9,19.1,-41,5.9,19.1,-41,5.9,15.4,-41],
// 4 0 -2.1 11.4 -41 -5.9 15.4 -41 5.9 15.4 -41 2.1 11.4 -41
  [4,0,-2.1,11.4,-41,-5.9,15.4,-41,5.9,15.4,-41,2.1,11.4,-41],
// 4 13 5.9 7.3 -41 2.1 7.3 -41 2.1 11.4 -41 5.9 11.4 -41
  [4,13,5.9,7.3,-41,2.1,7.3,-41,2.1,11.4,-41,5.9,11.4,-41],
// 4 16 7.5 5.5 -41 -7.5 5.5 -41 -5.9 7.3 -41 -2.1 7.3 -41
  [4,16,7.5,5.5,-41,-7.5,5.5,-41,-5.9,7.3,-41,-2.1,7.3,-41],
// 4 16 7.5 20 -41 7.5 5.5 -41 5.9 7.3 -41 5.9 11.4 -41
  [4,16,7.5,20,-41,7.5,5.5,-41,5.9,7.3,-41,5.9,11.4,-41],
// 3 16 5.9 15.4 -41 5.9 19.1 -41 7.5 20 -41
  [3,16,5.9,15.4,-41,5.9,19.1,-41,7.5,20,-41],
// 4 16 -7.5 20 -41 7.5 20 -41 5.9 19.1 -41 -5.9 19.1 -41
  [4,16,-7.5,20,-41,7.5,20,-41,5.9,19.1,-41,-5.9,19.1,-41],
// 4 16 -7.5 20 -41 -5.9 19.1 -41 -5.9 15.4 -41 -7.5 5.5 -41
  [4,16,-7.5,20,-41,-5.9,19.1,-41,-5.9,15.4,-41,-7.5,5.5,-41],
// 3 16 7.5 5.5 -41 2.1 7.3 -41 5.9 7.3 -41
  [3,16,7.5,5.5,-41,2.1,7.3,-41,5.9,7.3,-41],
// 3 16 7.5 5.5 -41 -2.1 7.3 -41 2.1 7.3 -41
  [3,16,7.5,5.5,-41,-2.1,7.3,-41,2.1,7.3,-41],
// 4 13 -2.1 7.3 -41 -5.9 7.3 -41 -5.9 11.4 -41 -2.1 11.4 -41
  [4,13,-2.1,7.3,-41,-5.9,7.3,-41,-5.9,11.4,-41,-2.1,11.4,-41],
// 3 16 -7.5 5.5 -41 -5.9 11.4 -41 -5.9 7.3 -41
  [3,16,-7.5,5.5,-41,-5.9,11.4,-41,-5.9,7.3,-41],
// 3 16 -7.5 5.5 -41 -5.9 15.4 -41 -5.9 11.4 -41
  [3,16,-7.5,5.5,-41,-5.9,15.4,-41,-5.9,11.4,-41],
// 3 0 5.9 11.4 -41 2.1 11.4 -41 5.9 15.4 -41
  [3,0,5.9,11.4,-41,2.1,11.4,-41,5.9,15.4,-41],
// 3 16 5.9 11.4 -41 5.9 15.4 -41 7.5 20 -41
  [3,16,5.9,11.4,-41,5.9,15.4,-41,7.5,20,-41],
// 3 0 -2.1 11.4 -41 -5.9 11.4 -41 -5.9 15.4 -41
  [3,0,-2.1,11.4,-41,-5.9,11.4,-41,-5.9,15.4,-41],
];
module ldraw_lib__20308p02(step=0, col=false, unit=2/5, alt=false, line=0.2, solid=!$preview)
    makepoly(ldraw_lib__20308p02(solid), step=step, col=col, unit=unit, alt=alt, line=line, solid=solid);
ldraw_lib__20308p02(line=0.2);
